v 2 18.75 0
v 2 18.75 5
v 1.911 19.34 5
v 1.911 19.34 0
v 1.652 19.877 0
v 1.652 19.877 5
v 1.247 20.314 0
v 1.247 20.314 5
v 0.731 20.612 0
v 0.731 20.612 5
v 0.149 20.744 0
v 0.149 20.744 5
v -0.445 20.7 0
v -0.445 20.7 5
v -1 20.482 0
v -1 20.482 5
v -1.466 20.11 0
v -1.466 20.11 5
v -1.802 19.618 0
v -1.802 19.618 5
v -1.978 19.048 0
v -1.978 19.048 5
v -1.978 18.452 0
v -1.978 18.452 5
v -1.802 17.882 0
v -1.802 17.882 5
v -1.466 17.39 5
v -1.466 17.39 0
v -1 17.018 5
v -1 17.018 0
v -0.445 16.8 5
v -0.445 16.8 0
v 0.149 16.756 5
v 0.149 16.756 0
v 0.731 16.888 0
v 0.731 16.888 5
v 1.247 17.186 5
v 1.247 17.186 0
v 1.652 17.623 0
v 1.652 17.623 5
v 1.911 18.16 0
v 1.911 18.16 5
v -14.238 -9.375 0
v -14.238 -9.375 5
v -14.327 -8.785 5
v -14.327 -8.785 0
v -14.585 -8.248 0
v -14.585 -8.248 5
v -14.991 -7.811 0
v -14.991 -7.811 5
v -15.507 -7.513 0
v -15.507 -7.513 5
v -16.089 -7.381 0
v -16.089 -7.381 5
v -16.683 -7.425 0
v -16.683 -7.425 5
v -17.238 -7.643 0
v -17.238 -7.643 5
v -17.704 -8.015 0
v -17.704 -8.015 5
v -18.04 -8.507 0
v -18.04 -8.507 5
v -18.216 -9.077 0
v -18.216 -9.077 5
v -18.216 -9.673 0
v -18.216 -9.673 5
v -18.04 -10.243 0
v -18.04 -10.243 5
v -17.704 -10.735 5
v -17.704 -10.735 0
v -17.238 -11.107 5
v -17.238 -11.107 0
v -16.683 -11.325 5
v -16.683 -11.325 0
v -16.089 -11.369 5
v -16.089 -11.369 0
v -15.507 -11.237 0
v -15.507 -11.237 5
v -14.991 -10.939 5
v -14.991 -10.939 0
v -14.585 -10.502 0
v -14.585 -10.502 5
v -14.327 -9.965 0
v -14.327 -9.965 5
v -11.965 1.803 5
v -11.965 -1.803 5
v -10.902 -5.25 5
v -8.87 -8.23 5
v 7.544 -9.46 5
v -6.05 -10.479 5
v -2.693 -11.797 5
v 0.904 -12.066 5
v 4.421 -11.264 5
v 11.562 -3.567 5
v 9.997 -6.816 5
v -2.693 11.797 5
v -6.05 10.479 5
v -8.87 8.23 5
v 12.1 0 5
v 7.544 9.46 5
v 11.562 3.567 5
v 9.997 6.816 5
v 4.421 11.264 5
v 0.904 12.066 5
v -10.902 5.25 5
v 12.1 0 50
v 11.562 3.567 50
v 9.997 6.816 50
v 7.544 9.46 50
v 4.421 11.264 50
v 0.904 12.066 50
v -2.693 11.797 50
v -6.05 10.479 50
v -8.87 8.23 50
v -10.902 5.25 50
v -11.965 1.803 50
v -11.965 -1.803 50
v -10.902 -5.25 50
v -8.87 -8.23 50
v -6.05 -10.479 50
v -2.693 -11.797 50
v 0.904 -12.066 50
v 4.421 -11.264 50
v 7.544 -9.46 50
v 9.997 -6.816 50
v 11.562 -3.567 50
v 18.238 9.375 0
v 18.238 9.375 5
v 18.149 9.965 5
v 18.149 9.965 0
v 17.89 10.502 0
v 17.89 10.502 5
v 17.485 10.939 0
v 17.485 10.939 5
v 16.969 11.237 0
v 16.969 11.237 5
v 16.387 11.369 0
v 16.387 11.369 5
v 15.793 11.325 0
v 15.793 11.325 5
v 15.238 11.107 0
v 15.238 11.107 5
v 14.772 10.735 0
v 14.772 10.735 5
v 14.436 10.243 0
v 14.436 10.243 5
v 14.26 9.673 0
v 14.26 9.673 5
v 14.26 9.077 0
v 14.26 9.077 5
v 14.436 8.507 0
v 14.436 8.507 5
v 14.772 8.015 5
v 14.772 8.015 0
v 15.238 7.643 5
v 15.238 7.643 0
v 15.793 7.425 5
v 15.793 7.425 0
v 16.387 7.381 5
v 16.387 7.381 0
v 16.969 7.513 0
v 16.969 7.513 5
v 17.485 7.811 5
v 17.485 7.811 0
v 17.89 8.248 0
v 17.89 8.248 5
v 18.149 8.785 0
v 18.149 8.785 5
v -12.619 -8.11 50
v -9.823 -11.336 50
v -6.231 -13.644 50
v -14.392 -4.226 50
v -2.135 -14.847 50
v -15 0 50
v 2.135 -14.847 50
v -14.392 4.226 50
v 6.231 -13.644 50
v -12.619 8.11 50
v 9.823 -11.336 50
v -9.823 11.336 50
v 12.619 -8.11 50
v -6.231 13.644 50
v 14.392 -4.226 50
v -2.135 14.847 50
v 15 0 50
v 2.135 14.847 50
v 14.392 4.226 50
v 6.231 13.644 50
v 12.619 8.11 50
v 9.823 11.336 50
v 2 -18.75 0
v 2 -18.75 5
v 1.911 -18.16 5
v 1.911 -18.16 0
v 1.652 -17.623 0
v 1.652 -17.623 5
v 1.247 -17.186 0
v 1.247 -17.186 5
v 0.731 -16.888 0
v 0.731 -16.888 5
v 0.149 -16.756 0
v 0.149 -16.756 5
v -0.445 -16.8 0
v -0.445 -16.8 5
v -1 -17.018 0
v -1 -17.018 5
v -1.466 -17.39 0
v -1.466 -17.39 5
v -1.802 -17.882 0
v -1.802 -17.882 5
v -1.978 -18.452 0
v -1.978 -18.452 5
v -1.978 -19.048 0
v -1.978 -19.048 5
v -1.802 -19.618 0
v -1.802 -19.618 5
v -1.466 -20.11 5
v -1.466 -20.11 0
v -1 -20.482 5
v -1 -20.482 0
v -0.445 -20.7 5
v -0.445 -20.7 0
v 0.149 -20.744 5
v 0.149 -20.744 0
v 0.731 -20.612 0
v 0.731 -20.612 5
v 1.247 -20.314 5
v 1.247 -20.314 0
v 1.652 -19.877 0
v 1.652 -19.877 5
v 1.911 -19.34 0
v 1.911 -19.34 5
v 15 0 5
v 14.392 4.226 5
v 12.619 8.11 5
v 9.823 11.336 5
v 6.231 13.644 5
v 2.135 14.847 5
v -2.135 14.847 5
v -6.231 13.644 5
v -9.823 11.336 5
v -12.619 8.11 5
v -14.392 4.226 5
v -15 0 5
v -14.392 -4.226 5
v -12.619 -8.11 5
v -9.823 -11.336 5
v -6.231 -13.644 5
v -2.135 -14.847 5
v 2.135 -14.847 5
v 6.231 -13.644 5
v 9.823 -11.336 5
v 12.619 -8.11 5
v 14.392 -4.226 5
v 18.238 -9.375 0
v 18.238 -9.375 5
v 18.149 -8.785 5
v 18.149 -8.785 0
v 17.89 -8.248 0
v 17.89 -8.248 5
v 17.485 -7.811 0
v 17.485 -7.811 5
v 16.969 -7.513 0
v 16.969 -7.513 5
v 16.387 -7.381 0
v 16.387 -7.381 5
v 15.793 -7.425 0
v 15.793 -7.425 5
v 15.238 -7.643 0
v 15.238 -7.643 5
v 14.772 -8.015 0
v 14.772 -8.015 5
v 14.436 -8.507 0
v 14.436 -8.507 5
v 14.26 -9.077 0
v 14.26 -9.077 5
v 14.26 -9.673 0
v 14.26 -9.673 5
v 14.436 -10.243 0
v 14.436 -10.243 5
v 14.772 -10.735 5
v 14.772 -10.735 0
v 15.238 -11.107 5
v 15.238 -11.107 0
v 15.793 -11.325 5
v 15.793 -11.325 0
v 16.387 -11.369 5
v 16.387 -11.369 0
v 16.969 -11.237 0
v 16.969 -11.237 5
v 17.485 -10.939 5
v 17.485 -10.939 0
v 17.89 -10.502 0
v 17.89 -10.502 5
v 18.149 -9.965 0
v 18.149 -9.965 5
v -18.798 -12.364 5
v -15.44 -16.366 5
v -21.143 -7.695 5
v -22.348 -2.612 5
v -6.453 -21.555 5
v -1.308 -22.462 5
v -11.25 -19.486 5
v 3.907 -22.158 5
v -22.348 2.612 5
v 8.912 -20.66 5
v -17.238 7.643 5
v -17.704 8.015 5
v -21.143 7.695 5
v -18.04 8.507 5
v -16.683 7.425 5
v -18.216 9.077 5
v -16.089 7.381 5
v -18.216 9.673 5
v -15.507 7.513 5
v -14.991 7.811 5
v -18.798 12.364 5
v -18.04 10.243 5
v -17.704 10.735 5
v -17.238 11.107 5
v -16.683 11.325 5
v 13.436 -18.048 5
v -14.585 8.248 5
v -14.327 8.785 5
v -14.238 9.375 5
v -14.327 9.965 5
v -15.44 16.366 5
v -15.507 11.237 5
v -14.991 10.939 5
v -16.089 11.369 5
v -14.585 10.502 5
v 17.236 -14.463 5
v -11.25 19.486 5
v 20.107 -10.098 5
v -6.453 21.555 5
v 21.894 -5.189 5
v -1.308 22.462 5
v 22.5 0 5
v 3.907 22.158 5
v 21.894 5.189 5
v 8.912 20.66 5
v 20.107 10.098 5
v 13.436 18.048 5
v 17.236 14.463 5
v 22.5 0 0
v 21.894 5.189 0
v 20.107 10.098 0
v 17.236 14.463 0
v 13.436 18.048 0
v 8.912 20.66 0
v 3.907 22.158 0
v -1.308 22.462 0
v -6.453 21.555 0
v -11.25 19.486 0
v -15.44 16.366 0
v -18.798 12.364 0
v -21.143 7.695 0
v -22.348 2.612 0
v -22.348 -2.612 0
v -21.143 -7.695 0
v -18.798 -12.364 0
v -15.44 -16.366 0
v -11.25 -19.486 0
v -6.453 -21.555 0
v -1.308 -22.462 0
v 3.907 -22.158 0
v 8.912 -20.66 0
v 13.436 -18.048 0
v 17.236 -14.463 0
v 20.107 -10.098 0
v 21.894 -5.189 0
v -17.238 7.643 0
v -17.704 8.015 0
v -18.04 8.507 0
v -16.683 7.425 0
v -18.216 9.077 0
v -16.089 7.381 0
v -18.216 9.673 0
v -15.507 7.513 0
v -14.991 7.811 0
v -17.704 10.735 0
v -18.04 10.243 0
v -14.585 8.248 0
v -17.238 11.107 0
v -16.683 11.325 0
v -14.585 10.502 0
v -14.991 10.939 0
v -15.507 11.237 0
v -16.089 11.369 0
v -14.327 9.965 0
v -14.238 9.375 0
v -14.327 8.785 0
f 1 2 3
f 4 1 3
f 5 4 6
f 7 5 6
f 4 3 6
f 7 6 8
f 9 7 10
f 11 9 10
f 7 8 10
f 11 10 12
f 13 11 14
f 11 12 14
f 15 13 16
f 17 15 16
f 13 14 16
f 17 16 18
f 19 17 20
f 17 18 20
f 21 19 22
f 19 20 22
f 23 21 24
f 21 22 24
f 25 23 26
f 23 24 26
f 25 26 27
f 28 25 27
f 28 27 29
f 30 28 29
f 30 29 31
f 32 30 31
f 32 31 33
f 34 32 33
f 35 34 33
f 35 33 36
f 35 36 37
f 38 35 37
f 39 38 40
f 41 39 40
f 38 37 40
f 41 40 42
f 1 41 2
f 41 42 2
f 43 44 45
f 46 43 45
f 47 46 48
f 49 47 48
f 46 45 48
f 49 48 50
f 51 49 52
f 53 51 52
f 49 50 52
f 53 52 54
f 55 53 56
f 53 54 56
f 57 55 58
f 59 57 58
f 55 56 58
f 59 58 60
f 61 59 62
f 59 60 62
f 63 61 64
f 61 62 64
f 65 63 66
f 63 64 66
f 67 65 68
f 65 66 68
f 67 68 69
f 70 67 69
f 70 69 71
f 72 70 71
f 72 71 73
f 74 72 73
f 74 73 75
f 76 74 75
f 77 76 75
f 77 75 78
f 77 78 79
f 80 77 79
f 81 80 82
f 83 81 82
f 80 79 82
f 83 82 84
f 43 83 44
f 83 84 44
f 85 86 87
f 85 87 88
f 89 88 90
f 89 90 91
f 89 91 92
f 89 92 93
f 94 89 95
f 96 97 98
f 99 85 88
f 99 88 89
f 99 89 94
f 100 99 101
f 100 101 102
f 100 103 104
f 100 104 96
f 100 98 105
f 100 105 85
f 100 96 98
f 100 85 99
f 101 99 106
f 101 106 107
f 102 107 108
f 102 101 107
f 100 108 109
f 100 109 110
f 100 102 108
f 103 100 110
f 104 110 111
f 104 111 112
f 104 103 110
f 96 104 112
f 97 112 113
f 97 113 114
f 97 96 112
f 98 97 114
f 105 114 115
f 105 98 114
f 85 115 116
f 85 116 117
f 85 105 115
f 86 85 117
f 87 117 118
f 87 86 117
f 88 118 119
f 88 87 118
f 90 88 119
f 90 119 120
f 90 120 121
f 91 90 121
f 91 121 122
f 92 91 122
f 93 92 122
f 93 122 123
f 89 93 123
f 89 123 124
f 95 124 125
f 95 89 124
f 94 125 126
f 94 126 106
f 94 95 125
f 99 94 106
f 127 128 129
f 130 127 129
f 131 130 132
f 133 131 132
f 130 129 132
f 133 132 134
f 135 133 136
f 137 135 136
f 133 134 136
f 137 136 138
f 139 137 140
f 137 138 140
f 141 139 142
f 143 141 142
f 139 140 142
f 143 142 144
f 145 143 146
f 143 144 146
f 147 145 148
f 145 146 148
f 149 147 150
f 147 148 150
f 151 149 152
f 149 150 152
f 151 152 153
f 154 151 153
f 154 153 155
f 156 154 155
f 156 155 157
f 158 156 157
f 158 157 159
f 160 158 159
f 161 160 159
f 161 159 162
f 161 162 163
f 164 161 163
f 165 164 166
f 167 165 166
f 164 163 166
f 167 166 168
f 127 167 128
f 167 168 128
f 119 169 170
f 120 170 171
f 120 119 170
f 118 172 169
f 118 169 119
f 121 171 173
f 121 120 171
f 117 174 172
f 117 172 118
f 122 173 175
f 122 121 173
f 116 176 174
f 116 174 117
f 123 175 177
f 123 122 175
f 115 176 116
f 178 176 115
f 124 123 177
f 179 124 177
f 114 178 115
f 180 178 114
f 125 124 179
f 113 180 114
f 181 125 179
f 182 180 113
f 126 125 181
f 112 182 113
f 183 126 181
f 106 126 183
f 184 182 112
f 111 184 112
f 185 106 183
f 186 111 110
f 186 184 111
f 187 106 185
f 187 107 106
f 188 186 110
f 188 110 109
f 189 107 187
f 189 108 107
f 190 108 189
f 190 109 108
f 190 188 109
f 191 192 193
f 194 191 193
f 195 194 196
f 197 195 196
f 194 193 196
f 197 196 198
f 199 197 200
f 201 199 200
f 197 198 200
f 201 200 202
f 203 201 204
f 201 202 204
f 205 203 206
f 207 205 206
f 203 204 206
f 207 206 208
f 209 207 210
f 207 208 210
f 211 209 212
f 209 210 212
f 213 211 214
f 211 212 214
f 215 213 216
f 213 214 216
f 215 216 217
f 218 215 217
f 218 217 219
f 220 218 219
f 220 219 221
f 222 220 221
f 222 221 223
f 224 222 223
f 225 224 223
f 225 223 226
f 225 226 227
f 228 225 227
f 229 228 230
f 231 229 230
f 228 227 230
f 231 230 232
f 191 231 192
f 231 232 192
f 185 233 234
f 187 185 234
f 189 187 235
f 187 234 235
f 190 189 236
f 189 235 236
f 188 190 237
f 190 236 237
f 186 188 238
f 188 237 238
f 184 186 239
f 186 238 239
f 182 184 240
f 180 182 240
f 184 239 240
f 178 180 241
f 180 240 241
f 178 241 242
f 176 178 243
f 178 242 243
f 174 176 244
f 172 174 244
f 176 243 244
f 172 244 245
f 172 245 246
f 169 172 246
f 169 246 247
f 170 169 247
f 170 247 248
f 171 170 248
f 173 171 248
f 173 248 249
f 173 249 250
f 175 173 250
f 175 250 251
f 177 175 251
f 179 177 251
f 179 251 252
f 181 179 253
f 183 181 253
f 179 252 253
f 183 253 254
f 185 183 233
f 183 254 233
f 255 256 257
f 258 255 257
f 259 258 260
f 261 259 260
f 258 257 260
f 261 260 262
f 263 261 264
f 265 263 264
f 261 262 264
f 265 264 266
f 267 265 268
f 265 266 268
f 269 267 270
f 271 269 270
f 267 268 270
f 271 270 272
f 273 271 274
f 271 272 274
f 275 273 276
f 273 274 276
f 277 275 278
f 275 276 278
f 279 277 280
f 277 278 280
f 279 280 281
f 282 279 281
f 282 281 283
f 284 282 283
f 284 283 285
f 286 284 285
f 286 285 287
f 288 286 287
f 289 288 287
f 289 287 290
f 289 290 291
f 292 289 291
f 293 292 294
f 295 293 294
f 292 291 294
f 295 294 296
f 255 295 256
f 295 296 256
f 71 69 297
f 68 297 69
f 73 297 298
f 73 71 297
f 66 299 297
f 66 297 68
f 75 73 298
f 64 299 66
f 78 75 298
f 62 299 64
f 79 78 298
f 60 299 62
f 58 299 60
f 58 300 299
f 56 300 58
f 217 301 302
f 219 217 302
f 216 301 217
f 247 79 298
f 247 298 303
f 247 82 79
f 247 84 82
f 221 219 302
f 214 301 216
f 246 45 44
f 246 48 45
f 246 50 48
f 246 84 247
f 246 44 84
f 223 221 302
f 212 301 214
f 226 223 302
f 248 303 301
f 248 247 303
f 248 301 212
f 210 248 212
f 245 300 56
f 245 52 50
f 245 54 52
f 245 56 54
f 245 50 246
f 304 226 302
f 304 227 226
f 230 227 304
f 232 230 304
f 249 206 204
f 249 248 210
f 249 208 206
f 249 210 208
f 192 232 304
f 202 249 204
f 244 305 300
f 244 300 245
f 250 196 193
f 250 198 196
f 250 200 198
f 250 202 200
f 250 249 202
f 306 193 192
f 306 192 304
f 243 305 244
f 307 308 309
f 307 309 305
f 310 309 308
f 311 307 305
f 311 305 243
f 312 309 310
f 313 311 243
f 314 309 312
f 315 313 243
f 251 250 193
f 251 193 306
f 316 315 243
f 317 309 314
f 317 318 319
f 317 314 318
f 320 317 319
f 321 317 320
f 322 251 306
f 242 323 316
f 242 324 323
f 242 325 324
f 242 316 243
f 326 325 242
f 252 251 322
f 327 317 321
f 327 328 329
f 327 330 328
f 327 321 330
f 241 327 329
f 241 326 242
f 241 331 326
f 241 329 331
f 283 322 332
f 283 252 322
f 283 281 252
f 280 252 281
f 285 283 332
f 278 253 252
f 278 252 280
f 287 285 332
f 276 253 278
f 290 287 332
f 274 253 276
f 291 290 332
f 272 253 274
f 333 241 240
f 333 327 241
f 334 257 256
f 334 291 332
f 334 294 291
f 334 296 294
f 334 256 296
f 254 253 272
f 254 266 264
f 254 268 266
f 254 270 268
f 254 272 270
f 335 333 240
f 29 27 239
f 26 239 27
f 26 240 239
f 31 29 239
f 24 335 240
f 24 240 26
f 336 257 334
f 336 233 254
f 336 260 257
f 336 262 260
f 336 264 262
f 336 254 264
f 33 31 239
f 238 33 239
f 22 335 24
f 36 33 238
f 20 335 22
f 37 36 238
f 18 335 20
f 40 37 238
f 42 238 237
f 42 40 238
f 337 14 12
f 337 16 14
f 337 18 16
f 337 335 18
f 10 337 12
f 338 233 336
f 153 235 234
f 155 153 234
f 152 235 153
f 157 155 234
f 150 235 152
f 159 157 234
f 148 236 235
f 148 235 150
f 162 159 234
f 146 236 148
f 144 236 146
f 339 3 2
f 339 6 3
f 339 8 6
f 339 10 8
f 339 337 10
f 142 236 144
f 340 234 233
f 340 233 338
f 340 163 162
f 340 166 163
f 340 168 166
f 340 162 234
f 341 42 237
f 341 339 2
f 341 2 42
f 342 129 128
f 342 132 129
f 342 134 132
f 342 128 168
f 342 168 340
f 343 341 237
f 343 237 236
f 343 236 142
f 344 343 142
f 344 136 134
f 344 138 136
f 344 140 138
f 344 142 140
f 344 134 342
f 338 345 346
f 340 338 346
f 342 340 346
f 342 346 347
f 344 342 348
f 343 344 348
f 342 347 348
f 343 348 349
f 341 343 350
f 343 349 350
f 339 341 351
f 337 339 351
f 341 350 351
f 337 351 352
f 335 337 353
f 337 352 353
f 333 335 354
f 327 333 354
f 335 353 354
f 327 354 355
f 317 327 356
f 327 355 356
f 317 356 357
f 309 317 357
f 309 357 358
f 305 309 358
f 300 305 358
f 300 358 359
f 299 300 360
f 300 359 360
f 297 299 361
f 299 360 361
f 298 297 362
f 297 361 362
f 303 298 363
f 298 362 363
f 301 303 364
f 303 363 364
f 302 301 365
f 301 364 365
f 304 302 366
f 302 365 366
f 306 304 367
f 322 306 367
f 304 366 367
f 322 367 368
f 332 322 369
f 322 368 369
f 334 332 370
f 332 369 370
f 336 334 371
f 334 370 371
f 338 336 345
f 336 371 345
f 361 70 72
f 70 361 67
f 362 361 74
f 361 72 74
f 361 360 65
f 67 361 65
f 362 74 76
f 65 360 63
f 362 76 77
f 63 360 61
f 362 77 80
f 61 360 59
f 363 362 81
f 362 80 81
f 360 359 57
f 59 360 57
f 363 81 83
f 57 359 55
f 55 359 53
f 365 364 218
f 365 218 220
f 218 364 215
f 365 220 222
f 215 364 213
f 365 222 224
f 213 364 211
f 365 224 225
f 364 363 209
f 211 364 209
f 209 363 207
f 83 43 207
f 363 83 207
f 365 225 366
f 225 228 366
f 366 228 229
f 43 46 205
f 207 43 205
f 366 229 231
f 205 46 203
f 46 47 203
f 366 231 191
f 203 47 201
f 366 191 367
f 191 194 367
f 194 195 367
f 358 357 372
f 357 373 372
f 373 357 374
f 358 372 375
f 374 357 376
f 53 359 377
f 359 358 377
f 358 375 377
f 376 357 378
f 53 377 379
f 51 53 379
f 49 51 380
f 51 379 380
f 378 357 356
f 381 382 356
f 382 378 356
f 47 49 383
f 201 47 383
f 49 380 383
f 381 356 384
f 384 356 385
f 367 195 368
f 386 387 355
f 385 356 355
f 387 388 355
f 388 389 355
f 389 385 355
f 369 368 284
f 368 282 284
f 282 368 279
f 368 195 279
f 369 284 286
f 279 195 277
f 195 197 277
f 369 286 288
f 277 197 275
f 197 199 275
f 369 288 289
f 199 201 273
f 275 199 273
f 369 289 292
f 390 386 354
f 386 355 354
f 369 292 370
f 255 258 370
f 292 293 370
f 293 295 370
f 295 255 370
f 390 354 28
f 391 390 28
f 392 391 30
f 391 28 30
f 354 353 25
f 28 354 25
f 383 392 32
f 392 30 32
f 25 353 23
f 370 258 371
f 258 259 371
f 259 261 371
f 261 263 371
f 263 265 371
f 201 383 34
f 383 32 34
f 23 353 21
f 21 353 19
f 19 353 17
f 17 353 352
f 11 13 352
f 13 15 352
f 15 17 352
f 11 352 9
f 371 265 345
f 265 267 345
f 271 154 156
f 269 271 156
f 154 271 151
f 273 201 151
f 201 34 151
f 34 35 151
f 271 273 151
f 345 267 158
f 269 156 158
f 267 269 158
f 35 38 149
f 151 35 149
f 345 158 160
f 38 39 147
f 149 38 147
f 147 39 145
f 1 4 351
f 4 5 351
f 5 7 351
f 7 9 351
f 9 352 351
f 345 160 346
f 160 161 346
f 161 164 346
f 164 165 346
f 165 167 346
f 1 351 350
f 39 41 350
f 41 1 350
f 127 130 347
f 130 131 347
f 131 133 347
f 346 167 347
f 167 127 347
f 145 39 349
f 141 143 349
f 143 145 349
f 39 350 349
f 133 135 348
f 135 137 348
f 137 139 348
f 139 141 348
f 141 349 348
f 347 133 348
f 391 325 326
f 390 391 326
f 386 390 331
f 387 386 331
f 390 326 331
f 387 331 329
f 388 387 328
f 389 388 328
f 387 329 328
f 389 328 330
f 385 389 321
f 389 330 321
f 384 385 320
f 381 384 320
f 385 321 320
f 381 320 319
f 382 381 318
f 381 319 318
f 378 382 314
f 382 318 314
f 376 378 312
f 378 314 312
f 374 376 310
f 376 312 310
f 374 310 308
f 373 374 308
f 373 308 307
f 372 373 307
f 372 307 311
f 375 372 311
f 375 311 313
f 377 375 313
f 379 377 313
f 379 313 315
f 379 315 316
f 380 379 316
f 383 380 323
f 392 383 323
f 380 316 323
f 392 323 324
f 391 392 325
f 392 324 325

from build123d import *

# Parameters (mm, degrees)
SKETCH1_R           = 22.5
BOSS_EXTRUDE1_DEPTH = 5
SKETCH2_R           = 15
SKETCH2_R_2         = 12.1
BOSS_EXTRUDE2_DEPTH = 45
SKETCH3_R           = 2
CUT_EXTRUDE1_DEPTH  = 5


with BuildPart() as part:
    # Sketch1 → Boss-Extrude1 (new body)
    with BuildSketch(Plane.XY):
        Circle(SKETCH1_R)
    extrude(amount=BOSS_EXTRUDE1_DEPTH)

    # Sketch2 → Boss-Extrude2 (add)
    with BuildSketch(Plane.XY.offset(5)):
        Circle(SKETCH2_R)
        Circle(SKETCH2_R_2, mode=Mode.SUBTRACT)
    extrude(amount=BOSS_EXTRUDE2_DEPTH)

    # Sketch3 → Cut-Extrude1 (cut)
    with BuildSketch(Plane.XY.offset(5)):
        with Locations((0, 18.75)):
            Circle(SKETCH3_R)
        with Locations((16.237976321, 9.375)):
            Circle(SKETCH3_R)
        with Locations((16.237976321, -9.375)):
            Circle(SKETCH3_R)
        with Locations((0, -18.75)):
            Circle(SKETCH3_R)
        with Locations((-16.237976321, -9.375)):
            Circle(SKETCH3_R)
        with Locations((-16.237976321, 9.375)):
            Circle(SKETCH3_R)
    extrude(amount=-CUT_EXTRUDE1_DEPTH, mode=Mode.SUBTRACT)


solid = part.part
